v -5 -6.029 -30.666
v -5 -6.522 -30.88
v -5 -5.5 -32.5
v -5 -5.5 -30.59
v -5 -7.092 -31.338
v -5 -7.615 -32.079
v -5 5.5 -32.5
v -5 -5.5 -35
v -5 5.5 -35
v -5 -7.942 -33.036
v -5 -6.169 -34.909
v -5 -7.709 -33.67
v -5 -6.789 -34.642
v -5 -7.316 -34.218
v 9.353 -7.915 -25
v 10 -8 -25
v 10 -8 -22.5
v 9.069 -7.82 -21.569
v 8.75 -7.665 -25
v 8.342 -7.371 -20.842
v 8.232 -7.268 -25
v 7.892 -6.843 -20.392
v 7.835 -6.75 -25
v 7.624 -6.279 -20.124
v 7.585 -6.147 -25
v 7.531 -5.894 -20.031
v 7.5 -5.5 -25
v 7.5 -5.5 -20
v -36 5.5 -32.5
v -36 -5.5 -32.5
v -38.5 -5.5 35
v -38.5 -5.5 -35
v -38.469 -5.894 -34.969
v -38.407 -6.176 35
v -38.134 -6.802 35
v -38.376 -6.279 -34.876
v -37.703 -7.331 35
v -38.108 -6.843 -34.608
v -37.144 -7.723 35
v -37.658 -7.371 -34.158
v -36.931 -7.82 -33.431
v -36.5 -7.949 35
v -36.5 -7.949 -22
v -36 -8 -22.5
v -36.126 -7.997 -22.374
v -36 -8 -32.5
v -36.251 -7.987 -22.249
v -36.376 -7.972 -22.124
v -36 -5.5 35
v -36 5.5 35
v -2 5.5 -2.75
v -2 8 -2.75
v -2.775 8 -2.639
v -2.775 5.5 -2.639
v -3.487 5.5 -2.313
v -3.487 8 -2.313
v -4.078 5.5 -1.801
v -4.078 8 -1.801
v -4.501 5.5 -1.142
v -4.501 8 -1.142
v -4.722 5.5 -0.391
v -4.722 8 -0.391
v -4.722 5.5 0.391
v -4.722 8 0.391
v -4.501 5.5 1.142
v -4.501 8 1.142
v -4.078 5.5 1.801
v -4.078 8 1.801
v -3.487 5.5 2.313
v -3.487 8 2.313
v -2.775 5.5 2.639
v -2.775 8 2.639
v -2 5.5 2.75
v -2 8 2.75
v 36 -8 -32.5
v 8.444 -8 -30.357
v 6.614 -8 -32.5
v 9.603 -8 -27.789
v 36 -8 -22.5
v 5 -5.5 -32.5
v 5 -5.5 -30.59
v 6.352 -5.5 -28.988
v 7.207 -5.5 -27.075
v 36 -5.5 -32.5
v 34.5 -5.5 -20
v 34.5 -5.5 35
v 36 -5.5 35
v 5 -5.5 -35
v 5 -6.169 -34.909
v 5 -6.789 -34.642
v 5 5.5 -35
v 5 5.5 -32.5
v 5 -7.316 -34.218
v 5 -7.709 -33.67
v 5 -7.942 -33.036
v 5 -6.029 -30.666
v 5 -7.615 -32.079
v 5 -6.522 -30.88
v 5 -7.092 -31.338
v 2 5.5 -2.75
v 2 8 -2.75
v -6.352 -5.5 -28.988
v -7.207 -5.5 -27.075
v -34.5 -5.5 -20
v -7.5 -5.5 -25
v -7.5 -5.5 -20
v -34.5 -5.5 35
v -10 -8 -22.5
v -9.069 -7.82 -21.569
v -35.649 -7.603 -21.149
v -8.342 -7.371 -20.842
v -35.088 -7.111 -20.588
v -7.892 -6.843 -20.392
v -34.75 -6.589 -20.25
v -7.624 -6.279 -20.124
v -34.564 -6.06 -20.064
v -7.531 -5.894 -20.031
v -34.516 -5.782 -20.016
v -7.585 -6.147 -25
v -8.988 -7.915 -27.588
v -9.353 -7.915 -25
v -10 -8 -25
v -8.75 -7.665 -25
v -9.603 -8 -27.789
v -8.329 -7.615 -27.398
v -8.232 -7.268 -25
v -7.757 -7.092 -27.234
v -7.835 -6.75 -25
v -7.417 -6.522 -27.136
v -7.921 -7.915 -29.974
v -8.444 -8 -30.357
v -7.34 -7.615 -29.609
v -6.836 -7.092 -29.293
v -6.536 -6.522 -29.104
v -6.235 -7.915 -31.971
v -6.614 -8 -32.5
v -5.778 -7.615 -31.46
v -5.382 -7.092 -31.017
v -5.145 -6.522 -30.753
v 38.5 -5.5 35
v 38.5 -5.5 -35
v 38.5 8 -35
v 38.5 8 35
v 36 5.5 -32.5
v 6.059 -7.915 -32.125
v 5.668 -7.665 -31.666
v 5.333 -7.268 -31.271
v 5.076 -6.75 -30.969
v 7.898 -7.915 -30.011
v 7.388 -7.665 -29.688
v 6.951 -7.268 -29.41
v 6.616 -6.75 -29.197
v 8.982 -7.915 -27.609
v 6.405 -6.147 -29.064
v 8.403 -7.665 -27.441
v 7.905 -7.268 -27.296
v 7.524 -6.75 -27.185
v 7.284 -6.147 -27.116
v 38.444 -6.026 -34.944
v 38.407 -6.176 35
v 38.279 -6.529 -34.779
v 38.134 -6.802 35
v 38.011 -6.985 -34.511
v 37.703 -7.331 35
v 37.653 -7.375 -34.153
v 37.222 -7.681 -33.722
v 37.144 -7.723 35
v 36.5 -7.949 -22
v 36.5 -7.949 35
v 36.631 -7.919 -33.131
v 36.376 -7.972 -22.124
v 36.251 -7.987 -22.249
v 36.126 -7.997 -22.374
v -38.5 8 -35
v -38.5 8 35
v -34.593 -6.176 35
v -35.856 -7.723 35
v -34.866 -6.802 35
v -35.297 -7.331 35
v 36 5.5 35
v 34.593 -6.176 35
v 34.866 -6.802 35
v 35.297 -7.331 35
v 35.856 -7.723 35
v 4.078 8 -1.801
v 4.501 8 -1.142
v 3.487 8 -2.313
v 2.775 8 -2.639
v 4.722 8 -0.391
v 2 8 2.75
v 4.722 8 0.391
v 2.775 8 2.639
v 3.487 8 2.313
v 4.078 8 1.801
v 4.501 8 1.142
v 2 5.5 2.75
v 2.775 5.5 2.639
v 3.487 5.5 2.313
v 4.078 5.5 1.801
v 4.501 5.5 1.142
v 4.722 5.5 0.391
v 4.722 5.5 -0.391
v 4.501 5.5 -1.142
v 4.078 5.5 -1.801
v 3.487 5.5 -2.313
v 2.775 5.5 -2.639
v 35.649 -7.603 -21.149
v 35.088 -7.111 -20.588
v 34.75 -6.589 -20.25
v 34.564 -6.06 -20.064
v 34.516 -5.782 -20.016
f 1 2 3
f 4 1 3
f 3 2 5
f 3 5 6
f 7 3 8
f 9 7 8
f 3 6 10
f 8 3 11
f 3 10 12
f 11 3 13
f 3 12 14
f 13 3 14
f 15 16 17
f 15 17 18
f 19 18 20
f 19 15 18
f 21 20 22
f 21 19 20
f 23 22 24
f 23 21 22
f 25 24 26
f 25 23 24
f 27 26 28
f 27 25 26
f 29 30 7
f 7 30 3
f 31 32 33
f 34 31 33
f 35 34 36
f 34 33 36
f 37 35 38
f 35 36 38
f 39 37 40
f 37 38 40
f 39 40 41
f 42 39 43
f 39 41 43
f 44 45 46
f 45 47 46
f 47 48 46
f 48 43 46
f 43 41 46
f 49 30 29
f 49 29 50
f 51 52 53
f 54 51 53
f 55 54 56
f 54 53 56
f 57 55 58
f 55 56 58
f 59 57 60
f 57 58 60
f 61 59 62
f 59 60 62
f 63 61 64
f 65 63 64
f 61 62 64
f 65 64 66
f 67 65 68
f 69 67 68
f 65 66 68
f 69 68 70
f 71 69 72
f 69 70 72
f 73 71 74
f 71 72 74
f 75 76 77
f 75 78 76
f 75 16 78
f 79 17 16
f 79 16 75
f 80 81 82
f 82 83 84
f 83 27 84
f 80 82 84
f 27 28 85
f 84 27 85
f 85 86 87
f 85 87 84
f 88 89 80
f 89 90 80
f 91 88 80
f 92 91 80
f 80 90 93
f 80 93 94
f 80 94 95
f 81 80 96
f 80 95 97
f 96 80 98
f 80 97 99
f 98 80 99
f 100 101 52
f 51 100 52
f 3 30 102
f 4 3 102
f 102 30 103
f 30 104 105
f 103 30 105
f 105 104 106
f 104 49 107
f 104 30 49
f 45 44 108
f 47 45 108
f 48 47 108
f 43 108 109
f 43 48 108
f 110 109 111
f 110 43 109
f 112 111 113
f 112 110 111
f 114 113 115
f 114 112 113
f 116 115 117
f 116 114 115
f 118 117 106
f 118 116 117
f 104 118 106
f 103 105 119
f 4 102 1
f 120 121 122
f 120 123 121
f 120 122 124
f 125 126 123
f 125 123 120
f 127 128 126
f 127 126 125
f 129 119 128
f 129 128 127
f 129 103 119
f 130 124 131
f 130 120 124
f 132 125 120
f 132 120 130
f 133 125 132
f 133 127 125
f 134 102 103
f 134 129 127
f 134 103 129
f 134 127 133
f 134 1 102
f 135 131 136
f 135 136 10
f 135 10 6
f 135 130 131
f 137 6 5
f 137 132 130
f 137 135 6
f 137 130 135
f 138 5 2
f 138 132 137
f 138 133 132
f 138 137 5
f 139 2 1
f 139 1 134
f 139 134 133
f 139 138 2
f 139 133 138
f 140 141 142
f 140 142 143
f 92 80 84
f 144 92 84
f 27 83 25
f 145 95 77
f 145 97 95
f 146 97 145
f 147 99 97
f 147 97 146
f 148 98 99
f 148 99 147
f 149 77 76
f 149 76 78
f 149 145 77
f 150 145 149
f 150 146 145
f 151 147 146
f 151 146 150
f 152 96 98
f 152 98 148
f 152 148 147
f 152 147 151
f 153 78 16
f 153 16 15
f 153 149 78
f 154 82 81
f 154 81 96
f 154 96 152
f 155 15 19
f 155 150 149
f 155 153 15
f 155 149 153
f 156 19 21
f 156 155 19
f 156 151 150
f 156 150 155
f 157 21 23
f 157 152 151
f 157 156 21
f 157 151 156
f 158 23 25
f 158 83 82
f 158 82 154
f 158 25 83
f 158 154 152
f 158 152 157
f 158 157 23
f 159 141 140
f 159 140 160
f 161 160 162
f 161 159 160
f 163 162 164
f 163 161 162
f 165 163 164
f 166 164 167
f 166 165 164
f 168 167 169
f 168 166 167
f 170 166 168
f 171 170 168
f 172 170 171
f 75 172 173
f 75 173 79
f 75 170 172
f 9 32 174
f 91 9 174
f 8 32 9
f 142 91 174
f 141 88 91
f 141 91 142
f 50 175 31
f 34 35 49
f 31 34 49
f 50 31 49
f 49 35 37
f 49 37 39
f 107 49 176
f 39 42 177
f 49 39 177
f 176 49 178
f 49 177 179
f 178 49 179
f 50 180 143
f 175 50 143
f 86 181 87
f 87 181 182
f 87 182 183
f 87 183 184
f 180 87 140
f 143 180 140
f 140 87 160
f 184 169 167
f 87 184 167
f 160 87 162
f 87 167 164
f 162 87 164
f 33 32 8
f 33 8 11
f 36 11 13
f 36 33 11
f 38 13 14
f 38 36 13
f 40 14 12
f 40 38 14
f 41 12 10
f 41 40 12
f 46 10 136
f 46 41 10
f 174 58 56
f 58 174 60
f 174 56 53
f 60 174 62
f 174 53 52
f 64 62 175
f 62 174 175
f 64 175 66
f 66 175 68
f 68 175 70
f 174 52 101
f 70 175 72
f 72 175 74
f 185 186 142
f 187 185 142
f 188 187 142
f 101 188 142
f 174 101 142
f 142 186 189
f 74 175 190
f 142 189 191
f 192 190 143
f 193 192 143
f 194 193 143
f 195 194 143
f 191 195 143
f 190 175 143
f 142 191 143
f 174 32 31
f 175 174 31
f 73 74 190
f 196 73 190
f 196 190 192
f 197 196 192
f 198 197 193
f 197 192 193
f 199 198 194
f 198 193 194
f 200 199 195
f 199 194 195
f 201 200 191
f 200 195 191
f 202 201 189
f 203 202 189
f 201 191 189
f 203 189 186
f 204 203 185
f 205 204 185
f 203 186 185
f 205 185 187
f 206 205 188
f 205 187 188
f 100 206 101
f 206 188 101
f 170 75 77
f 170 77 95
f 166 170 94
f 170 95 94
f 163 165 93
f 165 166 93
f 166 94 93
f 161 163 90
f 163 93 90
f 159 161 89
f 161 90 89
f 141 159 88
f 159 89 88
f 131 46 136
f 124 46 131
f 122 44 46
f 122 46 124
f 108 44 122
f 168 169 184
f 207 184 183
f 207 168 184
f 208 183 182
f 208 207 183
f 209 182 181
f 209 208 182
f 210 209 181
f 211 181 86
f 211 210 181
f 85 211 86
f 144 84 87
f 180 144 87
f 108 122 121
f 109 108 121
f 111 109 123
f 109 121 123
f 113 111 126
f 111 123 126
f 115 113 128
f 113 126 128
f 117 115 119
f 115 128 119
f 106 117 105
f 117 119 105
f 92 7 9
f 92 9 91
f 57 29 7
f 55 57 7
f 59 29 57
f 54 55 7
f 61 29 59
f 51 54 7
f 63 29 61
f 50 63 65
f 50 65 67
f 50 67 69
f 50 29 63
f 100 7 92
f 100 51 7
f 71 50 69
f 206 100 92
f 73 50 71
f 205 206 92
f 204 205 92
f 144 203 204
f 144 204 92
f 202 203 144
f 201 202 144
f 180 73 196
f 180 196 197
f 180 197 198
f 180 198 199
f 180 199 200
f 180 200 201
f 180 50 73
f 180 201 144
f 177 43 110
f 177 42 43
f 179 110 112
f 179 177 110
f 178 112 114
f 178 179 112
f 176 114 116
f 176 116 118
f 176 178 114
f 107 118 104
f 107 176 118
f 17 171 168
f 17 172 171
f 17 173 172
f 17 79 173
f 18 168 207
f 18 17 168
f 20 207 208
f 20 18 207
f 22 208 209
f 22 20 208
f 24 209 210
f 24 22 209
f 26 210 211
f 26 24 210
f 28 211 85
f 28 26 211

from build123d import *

# Parameters (mm, degrees)
F0_W         = 77
F0_H         = 70
F1_DEPTH     = 8
F2_T         = -2.5
F4_DEPTH     = 13.5
F6_DEPTH     = 2.5
F7_T1_DEPTH  = 82.5
F7_T3_DEPTH  = 46
F7_T5_DEPTH  = 46
F7_T7_DEPTH  = 33.25
F7_T9_DEPTH  = 33.25
F7_T11_DEPTH = 61.25
F7_T13_DEPTH = 11.25
F7_T16_ANGLE = 95.9416658211
F7_T18_ANGLE = 95.9416658211
F7_T23_DEPTH = 39.5
F7_T27_DEPTH = 67.5
F7_T34_DEPTH = 67.5
F7_T38_DEPTH = 39.5


# Not quite as in the source:
# - a fillet or chamfer that OpenCascade refuses, or shapes differently, is made with other operations: its cross-section is extruded or revolved along the edge and cut away or added


with BuildPart() as f1:
    # F0 (on Front) → F1 (new body, symmetric)
    with BuildSketch(Plane.XZ):
        Rectangle(F0_W, F0_H)
    extrude(amount=F1_DEPTH, both=True)

    # F2
    f2_openings = [f1.faces().sort_by_distance(p)[0] for p in [
        (0, 0, 35),
    ]]
    offset(amount=F2_T, openings=f2_openings)

    # F3 (on face) → F4 (cut, through all)
    with BuildSketch(Plane.XZ.offset(8)):
        Polygon((34.5, 35), (-34.5, 35), (-34.5, -20), (-7.5, -20), (7.5, -20), (34.5, -20), align=None)
        with BuildLine():
            Line((7.5, -20), (-7.5, -20))
            Line((-7.5, -20), (-7.5, -25))
            ThreePointArc((-7.5, -25), (-6.8465319688, -28.0618621785), (-5, -30.5901699437))
            ThreePointArc((-5, -30.5901699437), (0, -32.5), (5, -30.5901699437))
            ThreePointArc((5, -30.5901699437), (6.8465319688, -28.0618621785), (7.5, -25))
            Line((7.5, -25), (7.5, -20))
        make_face()
        with BuildLine():
            Line((-5, -30.5901699437), (-5, -35))
            Line((-5, -35), (5, -35))
            Line((5, -35), (5, -30.5901699437))
            ThreePointArc((5, -30.5901699437), (0, -32.5), (-5, -30.5901699437))
        make_face()
    extrude(amount=-F4_DEPTH, mode=Mode.SUBTRACT)

    # F5 (on face) → F6 (cut, through all)
    with BuildSketch(Plane(origin=(0, 8, 0), x_dir=(-1, 0, 0), z_dir=(0, 1, 0))):
        with BuildLine():
            ThreePointArc((2, -2.75), (4.75, 0), (2, 2.75))
            Line((2, 2.75), (-2, 2.75))
            ThreePointArc((-2, 2.75), (-4.75, 0), (-2, -2.75))
            Line((-2, -2.75), (2, -2.75))
        make_face()
    extrude(amount=-F6_DEPTH, mode=Mode.SUBTRACT)

    # F7: fillet of radius 2.5 on 10 edges, made by hand

    # F7_s2 → F7_t1 (cut)
    with BuildSketch(Plane.XY.offset(-41.25)):
        with BuildLine():
            ThreePointArc((38.5, -5.5), (37.767766953, -7.267766953), (36, -8))
            Line((36, -8), (38.5, -8))
            Line((38.5, -8), (38.5, -5.5))
        make_face()
        with BuildLine():
            ThreePointArc((-38.5, -5.5), (-37.767766953, -7.267766953), (-36, -8))
            Line((-36, -8), (-38.5, -8))
            Line((-38.5, -8), (-38.5, -5.5))
        make_face()
    extrude(amount=F7_T1_DEPTH, mode=Mode.SUBTRACT)

    # F7_s4 → F7_t3 (cut)
    with BuildSketch(Plane.YZ.offset(-44.75)):
        with BuildLine():
            ThreePointArc((-5.5, -35), (-7.267766953, -34.267766953), (-8, -32.5))
            Line((-8, -32.5), (-8, -35))
            Line((-8, -35), (-5.5, -35))
        make_face()
    extrude(amount=F7_T3_DEPTH, mode=Mode.SUBTRACT)

    # F7_s6 → F7_t5 (cut)
    with BuildSketch(Plane.YZ.offset(-1.25)):
        with BuildLine():
            ThreePointArc((-8, -32.5), (-7.267766953, -34.267766953), (-5.5, -35))
            Line((-5.5, -35), (-8, -35))
            Line((-8, -35), (-8, -32.5))
        make_face()
    extrude(amount=F7_T5_DEPTH, mode=Mode.SUBTRACT)

    # F7_s8 → F7_t7 (cut)
    with BuildSketch(Plane.YZ.offset(1.25)):
        with BuildLine():
            ThreePointArc((-8, -22.5), (-7.267766953, -20.732233047), (-5.5, -20))
            Line((-5.5, -20), (-8, -20))
            Line((-8, -20), (-8, -22.5))
        make_face()
    extrude(amount=F7_T7_DEPTH, mode=Mode.SUBTRACT)

    # F7_s10 → F7_t9 (cut)
    with BuildSketch(Plane.YZ.offset(-34.5)):
        with BuildLine():
            ThreePointArc((-8, -22.5), (-7.267766953, -20.732233047), (-5.5, -20))
            Line((-5.5, -20), (-8, -20))
            Line((-8, -20), (-8, -22.5))
        make_face()
    extrude(amount=F7_T9_DEPTH, mode=Mode.SUBTRACT)

    # F7_s12 → F7_t11 (cut)
    with BuildSketch(Plane.XY.offset(-20)):
        with BuildLine():
            ThreePointArc((37, -8), (35.232233047, -7.267766953), (34.5, -5.5))
            Line((34.5, -5.5), (34.5, -8))
            Line((34.5, -8), (37, -8))
        make_face()
        with BuildLine():
            ThreePointArc((-37, -8), (-35.232233047, -7.267766953), (-34.5, -5.5))
            Line((-34.5, -5.5), (-34.5, -8))
            Line((-34.5, -8), (-37, -8))
        make_face()
    extrude(amount=F7_T11_DEPTH, mode=Mode.SUBTRACT)

    # F7_s14 → F7_t13 (cut)
    with BuildSketch(Plane.XY.offset(-25)):
        with BuildLine():
            ThreePointArc((10, -8), (8.232233047, -7.267766953), (7.5, -5.5))
            Line((7.5, -5.5), (7.5, -8))
            Line((7.5, -8), (10, -8))
        make_face()
        with BuildLine():
            ThreePointArc((-10, -8), (-8.232233047, -7.267766953), (-7.5, -5.5))
            Line((-7.5, -5.5), (-7.5, -8))
            Line((-7.5, -8), (-10, -8))
        make_face()
    extrude(amount=F7_T13_DEPTH, mode=Mode.SUBTRACT)

    # F7_s15 → F7_t16 (revolve, cut)
    with BuildSketch(Plane.XY.offset(-25)):
        with BuildLine():
            ThreePointArc((-10, -8), (-8.232233047, -7.267766953), (-7.5, -5.5))
            Line((-7.5, -5.5), (-7.5, -8))
            Line((-7.5, -8), (-10, -8))
        make_face()
    revolve(axis=Axis((0, -8, -25), (0, -1, 0)), revolution_arc=F7_T16_ANGLE, mode=Mode.SUBTRACT)

    # F7_s17 → F7_t18 (revolve, cut)
    with BuildSketch(Plane(origin=(2.5739938884, 0, -0.2678883482), x_dir=(0, 1, 0), z_dir=(-0.9946278028, 0, 0.1035158632))):
        with BuildLine():
            ThreePointArc((-8, 34.8656950696), (-7.267766953, 33.0979281167), (-5.5, 32.3656950696))
            Line((-5.5, 32.3656950696), (-8, 32.3656950696))
            Line((-8, 32.3656950696), (-8, 34.8656950696))
        make_face()
    revolve(axis=Axis((0, -8, -25), (0, -1, 0)), revolution_arc=F7_T18_ANGLE, mode=Mode.SUBTRACT)


with BuildPart() as f7_tool21:
    # F7_s22 → F7_t23 (new body)
    with BuildSketch(Plane.YZ.offset(1.25)):
        with BuildLine():
            ThreePointArc((-8, -22.5), (-7.267766953, -20.732233047), (-5.5, -20))
            Line((-5.5, -20), (-8, -20))
            Line((-8, -20), (-8, -22.5))
        make_face()
    extrude(amount=F7_T23_DEPTH)

    split(bisect_by=Plane.YZ.offset(34.5), keep=Keep.TOP)


with BuildPart() as f7_tool25:
    # F7_s26 → F7_t27 (new body)
    with BuildSketch(Plane.XY.offset(-26.25)):
        with BuildLine():
            ThreePointArc((37, -8), (35.232233047, -7.267766953), (34.5, -5.5))
            Line((34.5, -5.5), (34.5, -8))
            Line((34.5, -8), (37, -8))
        make_face()
    extrude(amount=F7_T27_DEPTH)

    split(bisect_by=Plane.XY.offset(-20), keep=Keep.BOTTOM)


with BuildPart() as f7_tool21_1:
    add(f7_tool21.part)

    # F7_t29: intersect F7_tool25
    add(f7_tool25.part, mode=Mode.INTERSECT)


with BuildPart() as f1_1:
    add(f1.part)

    # F7_t19: cut F7_tool21
    add(f7_tool21_1.part, mode=Mode.SUBTRACT)


with BuildPart() as f7_tool32:
    # F7_s33 → F7_t34 (new body)
    with BuildSketch(Plane.XY.offset(41.25)):
        with BuildLine():
            ThreePointArc((-37, -8), (-35.232233047, -7.267766953), (-34.5, -5.5))
            Line((-34.5, -5.5), (-34.5, -8))
            Line((-34.5, -8), (-37, -8))
        make_face()
    extrude(amount=-F7_T34_DEPTH)

    split(bisect_by=Plane.XY.offset(-20), keep=Keep.BOTTOM)


with BuildPart() as f7_tool36:
    # F7_s37 → F7_t38 (new body)
    with BuildSketch(Plane.YZ.offset(-40.75)):
        with BuildLine():
            ThreePointArc((-8, -22.5), (-7.267766953, -20.732233047), (-5.5, -20))
            Line((-5.5, -20), (-8, -20))
            Line((-8, -20), (-8, -22.5))
        make_face()
    extrude(amount=F7_T38_DEPTH)

    split(bisect_by=Plane.YZ.offset(-34.5), keep=Keep.BOTTOM)


with BuildPart() as f7_tool32_1:
    add(f7_tool32.part)

    # F7_t40: intersect F7_tool36
    add(f7_tool36.part, mode=Mode.INTERSECT)


with BuildPart() as f1_2:
    add(f1_1.part)

    # F7_t30: cut F7_tool32
    add(f7_tool32_1.part, mode=Mode.SUBTRACT)


solid = f1_2.part
